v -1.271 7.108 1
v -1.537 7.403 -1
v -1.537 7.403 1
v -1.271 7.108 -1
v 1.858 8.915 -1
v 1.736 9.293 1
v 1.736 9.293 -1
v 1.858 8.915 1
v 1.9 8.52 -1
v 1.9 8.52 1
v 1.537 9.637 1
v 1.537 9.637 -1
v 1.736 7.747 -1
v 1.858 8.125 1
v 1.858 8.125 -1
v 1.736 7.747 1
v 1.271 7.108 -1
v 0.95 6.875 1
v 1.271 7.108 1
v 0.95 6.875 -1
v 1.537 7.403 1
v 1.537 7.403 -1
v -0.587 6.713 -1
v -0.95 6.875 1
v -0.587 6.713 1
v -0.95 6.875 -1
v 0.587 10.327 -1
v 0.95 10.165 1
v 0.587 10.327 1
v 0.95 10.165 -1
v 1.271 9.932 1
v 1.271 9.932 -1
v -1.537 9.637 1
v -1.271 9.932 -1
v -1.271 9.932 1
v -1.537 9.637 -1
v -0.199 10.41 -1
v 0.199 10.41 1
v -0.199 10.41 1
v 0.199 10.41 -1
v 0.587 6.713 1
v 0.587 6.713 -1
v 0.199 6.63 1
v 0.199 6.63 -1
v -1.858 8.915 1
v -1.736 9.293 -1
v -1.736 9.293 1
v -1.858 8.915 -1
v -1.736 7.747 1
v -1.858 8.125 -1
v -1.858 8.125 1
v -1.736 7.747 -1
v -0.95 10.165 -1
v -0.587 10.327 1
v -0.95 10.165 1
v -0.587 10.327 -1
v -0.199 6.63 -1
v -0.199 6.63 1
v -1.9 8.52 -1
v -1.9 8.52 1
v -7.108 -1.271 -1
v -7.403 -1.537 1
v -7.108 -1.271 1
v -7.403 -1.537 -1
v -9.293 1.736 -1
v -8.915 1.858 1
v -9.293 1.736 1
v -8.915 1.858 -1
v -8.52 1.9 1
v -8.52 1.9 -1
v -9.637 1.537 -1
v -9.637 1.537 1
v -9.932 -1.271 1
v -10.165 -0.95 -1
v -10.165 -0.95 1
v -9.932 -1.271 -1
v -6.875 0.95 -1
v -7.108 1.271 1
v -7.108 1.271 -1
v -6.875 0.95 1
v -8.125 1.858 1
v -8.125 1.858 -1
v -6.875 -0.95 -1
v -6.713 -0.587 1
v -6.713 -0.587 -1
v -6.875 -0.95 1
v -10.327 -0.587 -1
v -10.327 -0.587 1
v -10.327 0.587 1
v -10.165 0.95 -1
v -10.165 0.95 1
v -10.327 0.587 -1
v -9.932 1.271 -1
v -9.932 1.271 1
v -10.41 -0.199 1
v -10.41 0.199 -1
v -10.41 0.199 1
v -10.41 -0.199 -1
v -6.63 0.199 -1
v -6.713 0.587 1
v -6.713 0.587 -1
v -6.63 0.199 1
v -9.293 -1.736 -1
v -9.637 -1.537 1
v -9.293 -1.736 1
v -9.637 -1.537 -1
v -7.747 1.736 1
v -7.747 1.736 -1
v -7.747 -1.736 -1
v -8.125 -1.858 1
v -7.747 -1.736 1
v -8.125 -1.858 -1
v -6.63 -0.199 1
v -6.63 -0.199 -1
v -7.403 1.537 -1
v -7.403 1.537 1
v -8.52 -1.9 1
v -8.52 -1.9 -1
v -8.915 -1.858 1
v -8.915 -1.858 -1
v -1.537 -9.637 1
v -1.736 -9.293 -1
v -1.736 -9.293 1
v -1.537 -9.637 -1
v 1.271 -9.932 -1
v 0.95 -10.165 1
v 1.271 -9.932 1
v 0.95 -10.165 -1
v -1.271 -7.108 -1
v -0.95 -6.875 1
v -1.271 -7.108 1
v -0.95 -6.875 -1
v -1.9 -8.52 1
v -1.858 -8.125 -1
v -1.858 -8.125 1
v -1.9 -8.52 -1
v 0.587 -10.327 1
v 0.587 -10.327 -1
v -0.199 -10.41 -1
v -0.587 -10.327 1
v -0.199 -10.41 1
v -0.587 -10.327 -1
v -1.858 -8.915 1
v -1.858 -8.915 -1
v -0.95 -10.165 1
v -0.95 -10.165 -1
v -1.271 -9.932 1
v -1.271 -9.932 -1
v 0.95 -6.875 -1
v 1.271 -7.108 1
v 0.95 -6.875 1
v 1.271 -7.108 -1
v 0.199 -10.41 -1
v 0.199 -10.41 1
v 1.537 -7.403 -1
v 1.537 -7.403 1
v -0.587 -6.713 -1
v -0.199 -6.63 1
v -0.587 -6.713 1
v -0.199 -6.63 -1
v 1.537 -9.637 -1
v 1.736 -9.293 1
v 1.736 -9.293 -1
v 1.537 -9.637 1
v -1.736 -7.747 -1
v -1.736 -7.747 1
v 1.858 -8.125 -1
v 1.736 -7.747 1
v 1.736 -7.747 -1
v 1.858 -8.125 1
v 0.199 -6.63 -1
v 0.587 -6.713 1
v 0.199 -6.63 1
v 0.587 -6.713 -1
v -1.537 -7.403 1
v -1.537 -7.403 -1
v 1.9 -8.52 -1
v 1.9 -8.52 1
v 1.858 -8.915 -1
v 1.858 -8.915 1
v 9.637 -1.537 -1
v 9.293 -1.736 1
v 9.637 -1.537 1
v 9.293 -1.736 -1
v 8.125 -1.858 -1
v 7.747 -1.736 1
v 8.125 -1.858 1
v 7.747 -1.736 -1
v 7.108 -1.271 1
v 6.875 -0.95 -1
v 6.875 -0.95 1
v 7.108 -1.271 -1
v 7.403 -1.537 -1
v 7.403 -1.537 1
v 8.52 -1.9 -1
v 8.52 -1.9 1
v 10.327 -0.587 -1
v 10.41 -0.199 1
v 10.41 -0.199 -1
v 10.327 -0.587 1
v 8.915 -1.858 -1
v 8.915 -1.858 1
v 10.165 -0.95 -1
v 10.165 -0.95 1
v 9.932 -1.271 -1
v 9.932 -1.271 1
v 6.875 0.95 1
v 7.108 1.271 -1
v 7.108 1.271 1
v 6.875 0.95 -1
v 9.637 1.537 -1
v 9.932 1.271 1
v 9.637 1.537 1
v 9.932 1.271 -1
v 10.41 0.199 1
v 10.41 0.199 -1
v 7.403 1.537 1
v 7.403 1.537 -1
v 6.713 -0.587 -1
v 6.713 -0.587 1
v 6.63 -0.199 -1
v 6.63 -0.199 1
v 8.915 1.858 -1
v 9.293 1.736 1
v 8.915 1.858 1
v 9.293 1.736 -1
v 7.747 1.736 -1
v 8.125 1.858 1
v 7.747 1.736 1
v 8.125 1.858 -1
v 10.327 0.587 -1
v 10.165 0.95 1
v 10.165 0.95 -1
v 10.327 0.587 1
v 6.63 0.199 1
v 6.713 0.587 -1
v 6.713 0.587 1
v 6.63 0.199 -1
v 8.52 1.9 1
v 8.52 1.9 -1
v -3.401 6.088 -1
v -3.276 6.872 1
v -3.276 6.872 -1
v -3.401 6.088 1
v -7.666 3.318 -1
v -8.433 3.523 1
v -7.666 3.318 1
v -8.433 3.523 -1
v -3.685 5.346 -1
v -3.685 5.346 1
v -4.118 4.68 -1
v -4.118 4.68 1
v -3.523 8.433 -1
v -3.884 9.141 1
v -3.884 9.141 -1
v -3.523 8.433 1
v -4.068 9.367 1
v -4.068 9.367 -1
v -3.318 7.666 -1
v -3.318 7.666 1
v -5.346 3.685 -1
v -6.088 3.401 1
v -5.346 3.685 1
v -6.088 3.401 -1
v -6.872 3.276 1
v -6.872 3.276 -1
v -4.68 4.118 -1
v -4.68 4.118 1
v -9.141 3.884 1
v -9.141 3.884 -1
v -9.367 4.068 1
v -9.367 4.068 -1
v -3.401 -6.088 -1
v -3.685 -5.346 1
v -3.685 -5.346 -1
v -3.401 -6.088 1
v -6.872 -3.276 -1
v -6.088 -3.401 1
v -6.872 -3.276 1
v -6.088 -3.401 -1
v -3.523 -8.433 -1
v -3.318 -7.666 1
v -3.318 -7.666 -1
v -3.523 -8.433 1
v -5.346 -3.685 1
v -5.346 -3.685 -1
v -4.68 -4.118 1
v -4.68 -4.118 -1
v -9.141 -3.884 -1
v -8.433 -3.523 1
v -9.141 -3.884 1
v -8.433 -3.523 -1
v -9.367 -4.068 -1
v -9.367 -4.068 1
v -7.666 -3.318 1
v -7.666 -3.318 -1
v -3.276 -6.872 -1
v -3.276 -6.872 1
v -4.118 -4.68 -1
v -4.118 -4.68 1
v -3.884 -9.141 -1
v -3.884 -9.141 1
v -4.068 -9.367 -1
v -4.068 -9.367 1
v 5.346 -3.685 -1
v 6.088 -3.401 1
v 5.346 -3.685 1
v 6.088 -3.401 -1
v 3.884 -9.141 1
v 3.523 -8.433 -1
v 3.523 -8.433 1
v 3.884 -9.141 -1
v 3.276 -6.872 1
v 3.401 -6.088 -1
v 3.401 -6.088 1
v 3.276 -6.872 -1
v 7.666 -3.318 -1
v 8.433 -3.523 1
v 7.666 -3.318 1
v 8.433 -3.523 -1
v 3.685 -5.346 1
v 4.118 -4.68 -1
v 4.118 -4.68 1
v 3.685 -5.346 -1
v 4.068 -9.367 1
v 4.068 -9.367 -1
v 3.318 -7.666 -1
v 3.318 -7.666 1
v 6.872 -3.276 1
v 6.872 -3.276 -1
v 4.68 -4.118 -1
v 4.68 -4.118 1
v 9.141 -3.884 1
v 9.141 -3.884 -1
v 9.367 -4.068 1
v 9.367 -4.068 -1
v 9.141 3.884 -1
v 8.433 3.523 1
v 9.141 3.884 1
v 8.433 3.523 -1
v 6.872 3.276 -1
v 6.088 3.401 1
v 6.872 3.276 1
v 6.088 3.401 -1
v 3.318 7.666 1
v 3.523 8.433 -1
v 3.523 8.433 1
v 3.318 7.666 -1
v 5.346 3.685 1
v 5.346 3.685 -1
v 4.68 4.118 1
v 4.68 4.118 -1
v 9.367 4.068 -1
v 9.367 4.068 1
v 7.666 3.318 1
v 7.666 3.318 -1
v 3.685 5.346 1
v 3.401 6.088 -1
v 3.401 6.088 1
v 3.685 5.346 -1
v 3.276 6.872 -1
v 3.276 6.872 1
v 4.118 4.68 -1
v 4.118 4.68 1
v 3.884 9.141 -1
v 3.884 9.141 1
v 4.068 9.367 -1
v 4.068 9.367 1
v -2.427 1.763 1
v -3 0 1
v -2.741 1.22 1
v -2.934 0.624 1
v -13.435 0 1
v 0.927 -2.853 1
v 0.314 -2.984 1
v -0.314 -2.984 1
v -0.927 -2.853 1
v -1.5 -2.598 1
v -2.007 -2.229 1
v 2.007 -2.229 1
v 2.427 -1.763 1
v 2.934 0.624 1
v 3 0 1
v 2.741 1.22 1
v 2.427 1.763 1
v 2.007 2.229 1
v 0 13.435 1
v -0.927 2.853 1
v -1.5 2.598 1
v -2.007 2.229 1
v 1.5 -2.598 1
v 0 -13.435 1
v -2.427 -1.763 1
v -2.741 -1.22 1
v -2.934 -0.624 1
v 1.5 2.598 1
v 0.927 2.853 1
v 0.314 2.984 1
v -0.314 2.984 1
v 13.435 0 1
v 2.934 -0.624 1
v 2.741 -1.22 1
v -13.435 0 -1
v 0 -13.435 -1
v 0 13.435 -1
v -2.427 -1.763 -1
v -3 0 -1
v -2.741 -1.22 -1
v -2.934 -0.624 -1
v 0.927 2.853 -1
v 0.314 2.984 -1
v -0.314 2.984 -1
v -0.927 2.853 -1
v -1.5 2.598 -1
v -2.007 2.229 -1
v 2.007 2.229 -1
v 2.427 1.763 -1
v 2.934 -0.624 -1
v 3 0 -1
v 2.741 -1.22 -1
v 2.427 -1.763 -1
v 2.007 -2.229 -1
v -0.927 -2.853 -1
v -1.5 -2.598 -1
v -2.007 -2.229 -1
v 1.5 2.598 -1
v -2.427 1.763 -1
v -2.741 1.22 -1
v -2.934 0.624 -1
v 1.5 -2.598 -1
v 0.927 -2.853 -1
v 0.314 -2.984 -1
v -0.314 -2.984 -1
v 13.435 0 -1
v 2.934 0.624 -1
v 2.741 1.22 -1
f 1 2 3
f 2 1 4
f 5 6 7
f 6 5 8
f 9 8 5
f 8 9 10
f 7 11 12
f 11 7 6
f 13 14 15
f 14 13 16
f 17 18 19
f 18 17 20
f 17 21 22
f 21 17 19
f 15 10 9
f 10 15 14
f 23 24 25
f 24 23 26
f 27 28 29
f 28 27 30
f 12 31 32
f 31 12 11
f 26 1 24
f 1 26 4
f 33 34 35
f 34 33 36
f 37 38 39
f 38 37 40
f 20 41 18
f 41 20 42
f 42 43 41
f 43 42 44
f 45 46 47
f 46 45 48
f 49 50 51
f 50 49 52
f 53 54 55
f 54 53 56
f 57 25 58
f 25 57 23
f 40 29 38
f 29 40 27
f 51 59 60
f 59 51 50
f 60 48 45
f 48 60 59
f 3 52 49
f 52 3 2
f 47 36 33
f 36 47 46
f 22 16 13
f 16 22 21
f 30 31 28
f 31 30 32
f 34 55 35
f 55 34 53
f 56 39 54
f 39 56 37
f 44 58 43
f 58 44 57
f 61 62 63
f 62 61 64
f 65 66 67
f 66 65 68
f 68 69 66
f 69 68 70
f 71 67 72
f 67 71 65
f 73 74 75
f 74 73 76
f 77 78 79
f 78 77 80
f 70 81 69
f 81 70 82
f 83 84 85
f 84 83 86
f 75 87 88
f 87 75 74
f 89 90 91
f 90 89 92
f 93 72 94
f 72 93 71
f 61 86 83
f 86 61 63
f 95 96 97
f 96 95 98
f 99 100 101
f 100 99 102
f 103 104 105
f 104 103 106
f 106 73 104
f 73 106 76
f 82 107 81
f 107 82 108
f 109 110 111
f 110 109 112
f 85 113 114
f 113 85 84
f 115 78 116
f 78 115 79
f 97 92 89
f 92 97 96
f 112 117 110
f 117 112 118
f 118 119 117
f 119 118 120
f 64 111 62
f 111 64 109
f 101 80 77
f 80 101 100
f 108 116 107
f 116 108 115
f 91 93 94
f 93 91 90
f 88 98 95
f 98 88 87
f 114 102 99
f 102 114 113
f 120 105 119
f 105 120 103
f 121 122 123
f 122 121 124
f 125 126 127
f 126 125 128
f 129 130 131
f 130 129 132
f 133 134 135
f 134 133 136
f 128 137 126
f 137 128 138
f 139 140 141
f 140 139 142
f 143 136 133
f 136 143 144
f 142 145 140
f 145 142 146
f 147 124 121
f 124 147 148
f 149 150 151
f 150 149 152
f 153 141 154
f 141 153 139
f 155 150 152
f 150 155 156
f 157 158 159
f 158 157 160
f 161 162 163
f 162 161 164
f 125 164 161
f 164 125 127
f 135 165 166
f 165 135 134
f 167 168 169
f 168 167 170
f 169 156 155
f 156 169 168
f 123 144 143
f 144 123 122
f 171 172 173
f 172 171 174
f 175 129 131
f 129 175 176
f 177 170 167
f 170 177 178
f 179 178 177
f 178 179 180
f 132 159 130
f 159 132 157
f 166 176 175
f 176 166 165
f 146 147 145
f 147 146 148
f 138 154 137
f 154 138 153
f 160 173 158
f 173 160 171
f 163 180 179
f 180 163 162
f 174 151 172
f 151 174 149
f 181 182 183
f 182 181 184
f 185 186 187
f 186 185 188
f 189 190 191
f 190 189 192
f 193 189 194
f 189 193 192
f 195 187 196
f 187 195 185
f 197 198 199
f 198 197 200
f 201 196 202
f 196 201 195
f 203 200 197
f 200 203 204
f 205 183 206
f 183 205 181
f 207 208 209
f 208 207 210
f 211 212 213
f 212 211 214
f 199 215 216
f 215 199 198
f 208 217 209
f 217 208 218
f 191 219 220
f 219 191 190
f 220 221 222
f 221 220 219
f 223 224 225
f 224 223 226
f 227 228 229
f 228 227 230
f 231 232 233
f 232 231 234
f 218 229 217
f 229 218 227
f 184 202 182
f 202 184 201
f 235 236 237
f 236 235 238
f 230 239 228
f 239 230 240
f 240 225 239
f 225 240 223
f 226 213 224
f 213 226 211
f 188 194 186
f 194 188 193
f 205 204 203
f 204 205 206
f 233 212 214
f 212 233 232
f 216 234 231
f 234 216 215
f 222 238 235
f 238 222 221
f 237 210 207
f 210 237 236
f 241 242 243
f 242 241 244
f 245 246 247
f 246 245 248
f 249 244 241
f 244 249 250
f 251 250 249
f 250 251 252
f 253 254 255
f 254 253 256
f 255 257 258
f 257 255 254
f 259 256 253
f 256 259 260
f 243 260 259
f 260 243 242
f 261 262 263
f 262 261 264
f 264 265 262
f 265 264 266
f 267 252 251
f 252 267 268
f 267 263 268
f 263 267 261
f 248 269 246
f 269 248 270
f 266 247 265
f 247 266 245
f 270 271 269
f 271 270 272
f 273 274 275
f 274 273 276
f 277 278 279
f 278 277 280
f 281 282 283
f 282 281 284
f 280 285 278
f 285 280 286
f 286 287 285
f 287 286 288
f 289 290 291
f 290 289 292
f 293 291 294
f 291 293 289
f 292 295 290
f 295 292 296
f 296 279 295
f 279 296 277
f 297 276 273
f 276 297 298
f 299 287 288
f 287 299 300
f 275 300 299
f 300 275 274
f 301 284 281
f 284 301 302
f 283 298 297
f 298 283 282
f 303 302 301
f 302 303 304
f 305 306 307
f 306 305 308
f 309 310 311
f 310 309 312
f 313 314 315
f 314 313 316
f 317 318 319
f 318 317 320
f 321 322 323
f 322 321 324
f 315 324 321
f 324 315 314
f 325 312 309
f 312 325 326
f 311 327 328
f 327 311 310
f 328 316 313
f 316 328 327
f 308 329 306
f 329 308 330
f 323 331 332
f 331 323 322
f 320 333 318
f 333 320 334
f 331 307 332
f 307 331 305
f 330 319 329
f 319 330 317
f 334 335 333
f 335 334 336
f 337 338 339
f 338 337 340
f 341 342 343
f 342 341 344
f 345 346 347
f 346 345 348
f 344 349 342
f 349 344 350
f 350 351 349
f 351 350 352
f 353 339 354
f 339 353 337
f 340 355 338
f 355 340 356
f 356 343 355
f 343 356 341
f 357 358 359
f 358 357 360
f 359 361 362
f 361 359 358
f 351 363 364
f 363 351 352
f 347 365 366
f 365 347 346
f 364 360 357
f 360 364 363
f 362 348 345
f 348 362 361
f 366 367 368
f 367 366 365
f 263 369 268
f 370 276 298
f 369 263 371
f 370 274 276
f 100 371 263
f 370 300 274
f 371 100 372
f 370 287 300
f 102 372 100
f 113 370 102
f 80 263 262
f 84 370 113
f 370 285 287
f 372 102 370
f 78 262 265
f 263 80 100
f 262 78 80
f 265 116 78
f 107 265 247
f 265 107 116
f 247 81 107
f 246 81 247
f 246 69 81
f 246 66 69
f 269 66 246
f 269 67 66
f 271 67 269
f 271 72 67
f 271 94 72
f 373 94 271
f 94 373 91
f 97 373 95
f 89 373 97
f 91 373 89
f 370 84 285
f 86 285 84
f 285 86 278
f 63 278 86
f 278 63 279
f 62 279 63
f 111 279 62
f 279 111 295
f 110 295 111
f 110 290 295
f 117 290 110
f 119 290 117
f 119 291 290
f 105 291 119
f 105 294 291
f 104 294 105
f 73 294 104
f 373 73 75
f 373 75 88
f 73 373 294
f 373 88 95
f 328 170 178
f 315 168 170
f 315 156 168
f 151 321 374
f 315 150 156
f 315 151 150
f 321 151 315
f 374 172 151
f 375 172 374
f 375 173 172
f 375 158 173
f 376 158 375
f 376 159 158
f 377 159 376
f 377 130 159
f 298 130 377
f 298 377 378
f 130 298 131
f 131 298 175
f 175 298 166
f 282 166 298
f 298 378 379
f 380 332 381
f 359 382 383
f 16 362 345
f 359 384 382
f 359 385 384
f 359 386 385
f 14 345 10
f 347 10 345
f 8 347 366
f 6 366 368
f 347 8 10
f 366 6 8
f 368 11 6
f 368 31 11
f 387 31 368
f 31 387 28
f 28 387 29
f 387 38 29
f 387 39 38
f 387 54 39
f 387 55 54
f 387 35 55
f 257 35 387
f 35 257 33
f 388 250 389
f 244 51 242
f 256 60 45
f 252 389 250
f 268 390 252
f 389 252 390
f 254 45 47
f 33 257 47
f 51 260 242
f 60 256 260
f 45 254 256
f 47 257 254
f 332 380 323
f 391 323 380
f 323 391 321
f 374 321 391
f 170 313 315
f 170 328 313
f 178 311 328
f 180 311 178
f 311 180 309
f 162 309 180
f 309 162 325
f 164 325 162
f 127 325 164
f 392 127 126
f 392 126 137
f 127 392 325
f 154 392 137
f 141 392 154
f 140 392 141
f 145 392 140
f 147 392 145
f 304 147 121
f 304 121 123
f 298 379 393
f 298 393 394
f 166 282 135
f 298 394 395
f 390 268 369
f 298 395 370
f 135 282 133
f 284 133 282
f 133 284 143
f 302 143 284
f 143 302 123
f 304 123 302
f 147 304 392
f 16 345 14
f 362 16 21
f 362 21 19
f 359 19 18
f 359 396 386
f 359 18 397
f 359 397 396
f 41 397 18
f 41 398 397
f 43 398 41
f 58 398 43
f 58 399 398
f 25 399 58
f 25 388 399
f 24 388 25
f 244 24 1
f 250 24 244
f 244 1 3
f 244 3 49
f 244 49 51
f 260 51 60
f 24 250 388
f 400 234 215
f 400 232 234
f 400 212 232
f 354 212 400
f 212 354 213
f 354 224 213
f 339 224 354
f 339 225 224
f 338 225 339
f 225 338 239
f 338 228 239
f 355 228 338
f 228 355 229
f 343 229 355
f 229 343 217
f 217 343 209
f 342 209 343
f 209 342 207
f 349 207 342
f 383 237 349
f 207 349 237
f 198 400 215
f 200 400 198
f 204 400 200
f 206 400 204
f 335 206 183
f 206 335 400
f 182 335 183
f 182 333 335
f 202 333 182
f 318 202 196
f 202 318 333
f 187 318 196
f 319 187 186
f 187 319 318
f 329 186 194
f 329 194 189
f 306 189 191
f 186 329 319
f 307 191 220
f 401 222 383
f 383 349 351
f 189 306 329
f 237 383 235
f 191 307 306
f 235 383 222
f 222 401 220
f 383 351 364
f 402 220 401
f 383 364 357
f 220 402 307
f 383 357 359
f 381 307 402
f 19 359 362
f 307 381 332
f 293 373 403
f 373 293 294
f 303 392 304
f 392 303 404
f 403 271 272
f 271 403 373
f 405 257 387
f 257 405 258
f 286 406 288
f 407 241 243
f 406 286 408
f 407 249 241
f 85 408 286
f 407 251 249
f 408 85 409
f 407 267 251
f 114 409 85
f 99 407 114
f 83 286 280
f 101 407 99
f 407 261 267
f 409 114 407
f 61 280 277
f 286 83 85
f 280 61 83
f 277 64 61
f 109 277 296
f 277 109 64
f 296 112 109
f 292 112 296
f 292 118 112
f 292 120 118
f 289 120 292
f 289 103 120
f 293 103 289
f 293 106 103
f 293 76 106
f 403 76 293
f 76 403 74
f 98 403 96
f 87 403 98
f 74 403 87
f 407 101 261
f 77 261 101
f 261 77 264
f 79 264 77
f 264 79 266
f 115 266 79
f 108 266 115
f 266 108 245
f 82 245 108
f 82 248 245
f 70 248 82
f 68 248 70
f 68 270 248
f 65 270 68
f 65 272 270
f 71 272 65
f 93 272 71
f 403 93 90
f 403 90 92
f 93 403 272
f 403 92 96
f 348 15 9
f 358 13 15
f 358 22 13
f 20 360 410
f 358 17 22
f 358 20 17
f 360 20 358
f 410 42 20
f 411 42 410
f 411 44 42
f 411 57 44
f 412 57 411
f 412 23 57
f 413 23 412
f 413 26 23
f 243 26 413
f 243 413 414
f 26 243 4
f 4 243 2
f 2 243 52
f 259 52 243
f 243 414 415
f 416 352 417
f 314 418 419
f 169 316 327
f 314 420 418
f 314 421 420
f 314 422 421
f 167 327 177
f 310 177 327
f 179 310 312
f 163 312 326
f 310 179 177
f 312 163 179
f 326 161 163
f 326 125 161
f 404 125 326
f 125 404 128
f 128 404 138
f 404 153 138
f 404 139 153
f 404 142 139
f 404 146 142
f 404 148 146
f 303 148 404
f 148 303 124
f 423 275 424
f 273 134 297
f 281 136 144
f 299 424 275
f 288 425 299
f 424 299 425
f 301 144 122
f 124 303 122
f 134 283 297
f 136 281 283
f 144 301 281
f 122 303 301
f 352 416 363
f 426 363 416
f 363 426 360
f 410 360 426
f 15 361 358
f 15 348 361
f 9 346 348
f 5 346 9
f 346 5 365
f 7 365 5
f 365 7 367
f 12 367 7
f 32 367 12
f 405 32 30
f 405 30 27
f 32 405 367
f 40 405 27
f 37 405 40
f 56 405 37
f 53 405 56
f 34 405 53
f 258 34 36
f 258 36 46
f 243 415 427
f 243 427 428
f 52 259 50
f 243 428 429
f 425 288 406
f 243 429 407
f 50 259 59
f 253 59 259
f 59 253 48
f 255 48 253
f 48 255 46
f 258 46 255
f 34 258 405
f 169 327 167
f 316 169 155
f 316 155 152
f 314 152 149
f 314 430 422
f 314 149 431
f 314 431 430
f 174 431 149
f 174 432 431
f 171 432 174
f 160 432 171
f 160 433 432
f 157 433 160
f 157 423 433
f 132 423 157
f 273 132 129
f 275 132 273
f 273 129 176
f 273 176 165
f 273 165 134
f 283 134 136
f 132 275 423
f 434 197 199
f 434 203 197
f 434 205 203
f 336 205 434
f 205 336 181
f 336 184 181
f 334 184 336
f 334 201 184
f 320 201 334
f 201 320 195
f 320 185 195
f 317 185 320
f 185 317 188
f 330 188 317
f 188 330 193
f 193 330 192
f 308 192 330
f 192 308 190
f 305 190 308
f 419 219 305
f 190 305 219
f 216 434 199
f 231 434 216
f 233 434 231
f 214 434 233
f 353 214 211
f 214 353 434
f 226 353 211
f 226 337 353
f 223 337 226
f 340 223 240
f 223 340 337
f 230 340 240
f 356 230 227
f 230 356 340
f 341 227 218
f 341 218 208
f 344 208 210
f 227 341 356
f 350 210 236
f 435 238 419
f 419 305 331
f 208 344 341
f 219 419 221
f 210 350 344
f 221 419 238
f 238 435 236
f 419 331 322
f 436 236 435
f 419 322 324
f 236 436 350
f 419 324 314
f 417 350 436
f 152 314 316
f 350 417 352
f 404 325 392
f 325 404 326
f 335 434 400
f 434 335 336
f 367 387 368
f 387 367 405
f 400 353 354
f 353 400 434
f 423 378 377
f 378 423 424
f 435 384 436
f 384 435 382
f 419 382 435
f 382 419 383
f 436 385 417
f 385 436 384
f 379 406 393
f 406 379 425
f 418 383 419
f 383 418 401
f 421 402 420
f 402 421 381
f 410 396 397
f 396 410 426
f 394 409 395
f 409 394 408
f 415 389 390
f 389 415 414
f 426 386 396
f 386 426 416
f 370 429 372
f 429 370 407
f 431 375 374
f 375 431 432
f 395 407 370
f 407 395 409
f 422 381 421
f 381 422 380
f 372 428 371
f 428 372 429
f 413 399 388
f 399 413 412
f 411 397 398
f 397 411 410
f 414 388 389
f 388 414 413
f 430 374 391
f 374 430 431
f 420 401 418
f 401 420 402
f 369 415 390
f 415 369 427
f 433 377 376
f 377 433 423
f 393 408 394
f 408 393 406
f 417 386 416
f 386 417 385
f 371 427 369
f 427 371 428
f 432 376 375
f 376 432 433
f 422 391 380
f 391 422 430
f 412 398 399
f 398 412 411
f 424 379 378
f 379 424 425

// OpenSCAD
$fn=30;

//wheelMount();
motorMount();

module motorMount()
{
    screwRadius=1.9;
    difference()
    {
        union()
        {
            rotate([0,0,45]) cube([19,19, 2], center=true);
        }
        for (h =[0:90:360])
        {
            rotate([0,0,h]) translate([0,8.52,0]) cylinder(r=screwRadius, h=3, center=true);
        }
        
        for (h =[45:90:405])
        {
            rotate([0,0,h]) translate([0,10,0]) cylinder(r=3.8, h=3, center=true);
        }
        
        cylinder(r=3, h=3, center=true);
    }
    

}


module wheelMount()
{
    screwRadius=1;
    plugRadius=1.8;
    difference()
    {
        union(){
            cylinder(r=11.4, h=1.8, center=true);
            translate([0,0,3.5]) cylinder(r=2.65, h=8, center=true);
           
        }
        translate([0,11.8,11]) cube([20,20,20], center=true);
        translate([0,-11.8,11]) cube([20,20,20], center=true);
     
        for (h =[0:90:360])
        {
            rotate([0,0,h]) translate([0,6,0]) cylinder(r=screwRadius/1.2, r2=screwRadius*2, h=2, center=true);
        }
    
        //translate([0,6,0]) cylinder(r=screwRadius/1.2, r2=screwRadius*2, h=2, center=true);
        //translate([0,-6,0]) cylinder(r=screwRadius/1.2, r2=screwRadius*2, h=2, center=true);
        //translate([6,0,0]) cylinder(r=screwRadius/1.2, r2=screwRadius*2, h=2, center=true);
        //translate([-6,0,0]) cylinder(r=screwRadius/1.2, r2=screwRadius*2, h=2, center=true);
        
    }
    
    for (a =[22.5:45:382.5])
    {
        rotate([0,0,a]) translate([-9.5,0,-1.5]) cylinder(r=plugRadius, h=2, center=true);
    }  
    
}
